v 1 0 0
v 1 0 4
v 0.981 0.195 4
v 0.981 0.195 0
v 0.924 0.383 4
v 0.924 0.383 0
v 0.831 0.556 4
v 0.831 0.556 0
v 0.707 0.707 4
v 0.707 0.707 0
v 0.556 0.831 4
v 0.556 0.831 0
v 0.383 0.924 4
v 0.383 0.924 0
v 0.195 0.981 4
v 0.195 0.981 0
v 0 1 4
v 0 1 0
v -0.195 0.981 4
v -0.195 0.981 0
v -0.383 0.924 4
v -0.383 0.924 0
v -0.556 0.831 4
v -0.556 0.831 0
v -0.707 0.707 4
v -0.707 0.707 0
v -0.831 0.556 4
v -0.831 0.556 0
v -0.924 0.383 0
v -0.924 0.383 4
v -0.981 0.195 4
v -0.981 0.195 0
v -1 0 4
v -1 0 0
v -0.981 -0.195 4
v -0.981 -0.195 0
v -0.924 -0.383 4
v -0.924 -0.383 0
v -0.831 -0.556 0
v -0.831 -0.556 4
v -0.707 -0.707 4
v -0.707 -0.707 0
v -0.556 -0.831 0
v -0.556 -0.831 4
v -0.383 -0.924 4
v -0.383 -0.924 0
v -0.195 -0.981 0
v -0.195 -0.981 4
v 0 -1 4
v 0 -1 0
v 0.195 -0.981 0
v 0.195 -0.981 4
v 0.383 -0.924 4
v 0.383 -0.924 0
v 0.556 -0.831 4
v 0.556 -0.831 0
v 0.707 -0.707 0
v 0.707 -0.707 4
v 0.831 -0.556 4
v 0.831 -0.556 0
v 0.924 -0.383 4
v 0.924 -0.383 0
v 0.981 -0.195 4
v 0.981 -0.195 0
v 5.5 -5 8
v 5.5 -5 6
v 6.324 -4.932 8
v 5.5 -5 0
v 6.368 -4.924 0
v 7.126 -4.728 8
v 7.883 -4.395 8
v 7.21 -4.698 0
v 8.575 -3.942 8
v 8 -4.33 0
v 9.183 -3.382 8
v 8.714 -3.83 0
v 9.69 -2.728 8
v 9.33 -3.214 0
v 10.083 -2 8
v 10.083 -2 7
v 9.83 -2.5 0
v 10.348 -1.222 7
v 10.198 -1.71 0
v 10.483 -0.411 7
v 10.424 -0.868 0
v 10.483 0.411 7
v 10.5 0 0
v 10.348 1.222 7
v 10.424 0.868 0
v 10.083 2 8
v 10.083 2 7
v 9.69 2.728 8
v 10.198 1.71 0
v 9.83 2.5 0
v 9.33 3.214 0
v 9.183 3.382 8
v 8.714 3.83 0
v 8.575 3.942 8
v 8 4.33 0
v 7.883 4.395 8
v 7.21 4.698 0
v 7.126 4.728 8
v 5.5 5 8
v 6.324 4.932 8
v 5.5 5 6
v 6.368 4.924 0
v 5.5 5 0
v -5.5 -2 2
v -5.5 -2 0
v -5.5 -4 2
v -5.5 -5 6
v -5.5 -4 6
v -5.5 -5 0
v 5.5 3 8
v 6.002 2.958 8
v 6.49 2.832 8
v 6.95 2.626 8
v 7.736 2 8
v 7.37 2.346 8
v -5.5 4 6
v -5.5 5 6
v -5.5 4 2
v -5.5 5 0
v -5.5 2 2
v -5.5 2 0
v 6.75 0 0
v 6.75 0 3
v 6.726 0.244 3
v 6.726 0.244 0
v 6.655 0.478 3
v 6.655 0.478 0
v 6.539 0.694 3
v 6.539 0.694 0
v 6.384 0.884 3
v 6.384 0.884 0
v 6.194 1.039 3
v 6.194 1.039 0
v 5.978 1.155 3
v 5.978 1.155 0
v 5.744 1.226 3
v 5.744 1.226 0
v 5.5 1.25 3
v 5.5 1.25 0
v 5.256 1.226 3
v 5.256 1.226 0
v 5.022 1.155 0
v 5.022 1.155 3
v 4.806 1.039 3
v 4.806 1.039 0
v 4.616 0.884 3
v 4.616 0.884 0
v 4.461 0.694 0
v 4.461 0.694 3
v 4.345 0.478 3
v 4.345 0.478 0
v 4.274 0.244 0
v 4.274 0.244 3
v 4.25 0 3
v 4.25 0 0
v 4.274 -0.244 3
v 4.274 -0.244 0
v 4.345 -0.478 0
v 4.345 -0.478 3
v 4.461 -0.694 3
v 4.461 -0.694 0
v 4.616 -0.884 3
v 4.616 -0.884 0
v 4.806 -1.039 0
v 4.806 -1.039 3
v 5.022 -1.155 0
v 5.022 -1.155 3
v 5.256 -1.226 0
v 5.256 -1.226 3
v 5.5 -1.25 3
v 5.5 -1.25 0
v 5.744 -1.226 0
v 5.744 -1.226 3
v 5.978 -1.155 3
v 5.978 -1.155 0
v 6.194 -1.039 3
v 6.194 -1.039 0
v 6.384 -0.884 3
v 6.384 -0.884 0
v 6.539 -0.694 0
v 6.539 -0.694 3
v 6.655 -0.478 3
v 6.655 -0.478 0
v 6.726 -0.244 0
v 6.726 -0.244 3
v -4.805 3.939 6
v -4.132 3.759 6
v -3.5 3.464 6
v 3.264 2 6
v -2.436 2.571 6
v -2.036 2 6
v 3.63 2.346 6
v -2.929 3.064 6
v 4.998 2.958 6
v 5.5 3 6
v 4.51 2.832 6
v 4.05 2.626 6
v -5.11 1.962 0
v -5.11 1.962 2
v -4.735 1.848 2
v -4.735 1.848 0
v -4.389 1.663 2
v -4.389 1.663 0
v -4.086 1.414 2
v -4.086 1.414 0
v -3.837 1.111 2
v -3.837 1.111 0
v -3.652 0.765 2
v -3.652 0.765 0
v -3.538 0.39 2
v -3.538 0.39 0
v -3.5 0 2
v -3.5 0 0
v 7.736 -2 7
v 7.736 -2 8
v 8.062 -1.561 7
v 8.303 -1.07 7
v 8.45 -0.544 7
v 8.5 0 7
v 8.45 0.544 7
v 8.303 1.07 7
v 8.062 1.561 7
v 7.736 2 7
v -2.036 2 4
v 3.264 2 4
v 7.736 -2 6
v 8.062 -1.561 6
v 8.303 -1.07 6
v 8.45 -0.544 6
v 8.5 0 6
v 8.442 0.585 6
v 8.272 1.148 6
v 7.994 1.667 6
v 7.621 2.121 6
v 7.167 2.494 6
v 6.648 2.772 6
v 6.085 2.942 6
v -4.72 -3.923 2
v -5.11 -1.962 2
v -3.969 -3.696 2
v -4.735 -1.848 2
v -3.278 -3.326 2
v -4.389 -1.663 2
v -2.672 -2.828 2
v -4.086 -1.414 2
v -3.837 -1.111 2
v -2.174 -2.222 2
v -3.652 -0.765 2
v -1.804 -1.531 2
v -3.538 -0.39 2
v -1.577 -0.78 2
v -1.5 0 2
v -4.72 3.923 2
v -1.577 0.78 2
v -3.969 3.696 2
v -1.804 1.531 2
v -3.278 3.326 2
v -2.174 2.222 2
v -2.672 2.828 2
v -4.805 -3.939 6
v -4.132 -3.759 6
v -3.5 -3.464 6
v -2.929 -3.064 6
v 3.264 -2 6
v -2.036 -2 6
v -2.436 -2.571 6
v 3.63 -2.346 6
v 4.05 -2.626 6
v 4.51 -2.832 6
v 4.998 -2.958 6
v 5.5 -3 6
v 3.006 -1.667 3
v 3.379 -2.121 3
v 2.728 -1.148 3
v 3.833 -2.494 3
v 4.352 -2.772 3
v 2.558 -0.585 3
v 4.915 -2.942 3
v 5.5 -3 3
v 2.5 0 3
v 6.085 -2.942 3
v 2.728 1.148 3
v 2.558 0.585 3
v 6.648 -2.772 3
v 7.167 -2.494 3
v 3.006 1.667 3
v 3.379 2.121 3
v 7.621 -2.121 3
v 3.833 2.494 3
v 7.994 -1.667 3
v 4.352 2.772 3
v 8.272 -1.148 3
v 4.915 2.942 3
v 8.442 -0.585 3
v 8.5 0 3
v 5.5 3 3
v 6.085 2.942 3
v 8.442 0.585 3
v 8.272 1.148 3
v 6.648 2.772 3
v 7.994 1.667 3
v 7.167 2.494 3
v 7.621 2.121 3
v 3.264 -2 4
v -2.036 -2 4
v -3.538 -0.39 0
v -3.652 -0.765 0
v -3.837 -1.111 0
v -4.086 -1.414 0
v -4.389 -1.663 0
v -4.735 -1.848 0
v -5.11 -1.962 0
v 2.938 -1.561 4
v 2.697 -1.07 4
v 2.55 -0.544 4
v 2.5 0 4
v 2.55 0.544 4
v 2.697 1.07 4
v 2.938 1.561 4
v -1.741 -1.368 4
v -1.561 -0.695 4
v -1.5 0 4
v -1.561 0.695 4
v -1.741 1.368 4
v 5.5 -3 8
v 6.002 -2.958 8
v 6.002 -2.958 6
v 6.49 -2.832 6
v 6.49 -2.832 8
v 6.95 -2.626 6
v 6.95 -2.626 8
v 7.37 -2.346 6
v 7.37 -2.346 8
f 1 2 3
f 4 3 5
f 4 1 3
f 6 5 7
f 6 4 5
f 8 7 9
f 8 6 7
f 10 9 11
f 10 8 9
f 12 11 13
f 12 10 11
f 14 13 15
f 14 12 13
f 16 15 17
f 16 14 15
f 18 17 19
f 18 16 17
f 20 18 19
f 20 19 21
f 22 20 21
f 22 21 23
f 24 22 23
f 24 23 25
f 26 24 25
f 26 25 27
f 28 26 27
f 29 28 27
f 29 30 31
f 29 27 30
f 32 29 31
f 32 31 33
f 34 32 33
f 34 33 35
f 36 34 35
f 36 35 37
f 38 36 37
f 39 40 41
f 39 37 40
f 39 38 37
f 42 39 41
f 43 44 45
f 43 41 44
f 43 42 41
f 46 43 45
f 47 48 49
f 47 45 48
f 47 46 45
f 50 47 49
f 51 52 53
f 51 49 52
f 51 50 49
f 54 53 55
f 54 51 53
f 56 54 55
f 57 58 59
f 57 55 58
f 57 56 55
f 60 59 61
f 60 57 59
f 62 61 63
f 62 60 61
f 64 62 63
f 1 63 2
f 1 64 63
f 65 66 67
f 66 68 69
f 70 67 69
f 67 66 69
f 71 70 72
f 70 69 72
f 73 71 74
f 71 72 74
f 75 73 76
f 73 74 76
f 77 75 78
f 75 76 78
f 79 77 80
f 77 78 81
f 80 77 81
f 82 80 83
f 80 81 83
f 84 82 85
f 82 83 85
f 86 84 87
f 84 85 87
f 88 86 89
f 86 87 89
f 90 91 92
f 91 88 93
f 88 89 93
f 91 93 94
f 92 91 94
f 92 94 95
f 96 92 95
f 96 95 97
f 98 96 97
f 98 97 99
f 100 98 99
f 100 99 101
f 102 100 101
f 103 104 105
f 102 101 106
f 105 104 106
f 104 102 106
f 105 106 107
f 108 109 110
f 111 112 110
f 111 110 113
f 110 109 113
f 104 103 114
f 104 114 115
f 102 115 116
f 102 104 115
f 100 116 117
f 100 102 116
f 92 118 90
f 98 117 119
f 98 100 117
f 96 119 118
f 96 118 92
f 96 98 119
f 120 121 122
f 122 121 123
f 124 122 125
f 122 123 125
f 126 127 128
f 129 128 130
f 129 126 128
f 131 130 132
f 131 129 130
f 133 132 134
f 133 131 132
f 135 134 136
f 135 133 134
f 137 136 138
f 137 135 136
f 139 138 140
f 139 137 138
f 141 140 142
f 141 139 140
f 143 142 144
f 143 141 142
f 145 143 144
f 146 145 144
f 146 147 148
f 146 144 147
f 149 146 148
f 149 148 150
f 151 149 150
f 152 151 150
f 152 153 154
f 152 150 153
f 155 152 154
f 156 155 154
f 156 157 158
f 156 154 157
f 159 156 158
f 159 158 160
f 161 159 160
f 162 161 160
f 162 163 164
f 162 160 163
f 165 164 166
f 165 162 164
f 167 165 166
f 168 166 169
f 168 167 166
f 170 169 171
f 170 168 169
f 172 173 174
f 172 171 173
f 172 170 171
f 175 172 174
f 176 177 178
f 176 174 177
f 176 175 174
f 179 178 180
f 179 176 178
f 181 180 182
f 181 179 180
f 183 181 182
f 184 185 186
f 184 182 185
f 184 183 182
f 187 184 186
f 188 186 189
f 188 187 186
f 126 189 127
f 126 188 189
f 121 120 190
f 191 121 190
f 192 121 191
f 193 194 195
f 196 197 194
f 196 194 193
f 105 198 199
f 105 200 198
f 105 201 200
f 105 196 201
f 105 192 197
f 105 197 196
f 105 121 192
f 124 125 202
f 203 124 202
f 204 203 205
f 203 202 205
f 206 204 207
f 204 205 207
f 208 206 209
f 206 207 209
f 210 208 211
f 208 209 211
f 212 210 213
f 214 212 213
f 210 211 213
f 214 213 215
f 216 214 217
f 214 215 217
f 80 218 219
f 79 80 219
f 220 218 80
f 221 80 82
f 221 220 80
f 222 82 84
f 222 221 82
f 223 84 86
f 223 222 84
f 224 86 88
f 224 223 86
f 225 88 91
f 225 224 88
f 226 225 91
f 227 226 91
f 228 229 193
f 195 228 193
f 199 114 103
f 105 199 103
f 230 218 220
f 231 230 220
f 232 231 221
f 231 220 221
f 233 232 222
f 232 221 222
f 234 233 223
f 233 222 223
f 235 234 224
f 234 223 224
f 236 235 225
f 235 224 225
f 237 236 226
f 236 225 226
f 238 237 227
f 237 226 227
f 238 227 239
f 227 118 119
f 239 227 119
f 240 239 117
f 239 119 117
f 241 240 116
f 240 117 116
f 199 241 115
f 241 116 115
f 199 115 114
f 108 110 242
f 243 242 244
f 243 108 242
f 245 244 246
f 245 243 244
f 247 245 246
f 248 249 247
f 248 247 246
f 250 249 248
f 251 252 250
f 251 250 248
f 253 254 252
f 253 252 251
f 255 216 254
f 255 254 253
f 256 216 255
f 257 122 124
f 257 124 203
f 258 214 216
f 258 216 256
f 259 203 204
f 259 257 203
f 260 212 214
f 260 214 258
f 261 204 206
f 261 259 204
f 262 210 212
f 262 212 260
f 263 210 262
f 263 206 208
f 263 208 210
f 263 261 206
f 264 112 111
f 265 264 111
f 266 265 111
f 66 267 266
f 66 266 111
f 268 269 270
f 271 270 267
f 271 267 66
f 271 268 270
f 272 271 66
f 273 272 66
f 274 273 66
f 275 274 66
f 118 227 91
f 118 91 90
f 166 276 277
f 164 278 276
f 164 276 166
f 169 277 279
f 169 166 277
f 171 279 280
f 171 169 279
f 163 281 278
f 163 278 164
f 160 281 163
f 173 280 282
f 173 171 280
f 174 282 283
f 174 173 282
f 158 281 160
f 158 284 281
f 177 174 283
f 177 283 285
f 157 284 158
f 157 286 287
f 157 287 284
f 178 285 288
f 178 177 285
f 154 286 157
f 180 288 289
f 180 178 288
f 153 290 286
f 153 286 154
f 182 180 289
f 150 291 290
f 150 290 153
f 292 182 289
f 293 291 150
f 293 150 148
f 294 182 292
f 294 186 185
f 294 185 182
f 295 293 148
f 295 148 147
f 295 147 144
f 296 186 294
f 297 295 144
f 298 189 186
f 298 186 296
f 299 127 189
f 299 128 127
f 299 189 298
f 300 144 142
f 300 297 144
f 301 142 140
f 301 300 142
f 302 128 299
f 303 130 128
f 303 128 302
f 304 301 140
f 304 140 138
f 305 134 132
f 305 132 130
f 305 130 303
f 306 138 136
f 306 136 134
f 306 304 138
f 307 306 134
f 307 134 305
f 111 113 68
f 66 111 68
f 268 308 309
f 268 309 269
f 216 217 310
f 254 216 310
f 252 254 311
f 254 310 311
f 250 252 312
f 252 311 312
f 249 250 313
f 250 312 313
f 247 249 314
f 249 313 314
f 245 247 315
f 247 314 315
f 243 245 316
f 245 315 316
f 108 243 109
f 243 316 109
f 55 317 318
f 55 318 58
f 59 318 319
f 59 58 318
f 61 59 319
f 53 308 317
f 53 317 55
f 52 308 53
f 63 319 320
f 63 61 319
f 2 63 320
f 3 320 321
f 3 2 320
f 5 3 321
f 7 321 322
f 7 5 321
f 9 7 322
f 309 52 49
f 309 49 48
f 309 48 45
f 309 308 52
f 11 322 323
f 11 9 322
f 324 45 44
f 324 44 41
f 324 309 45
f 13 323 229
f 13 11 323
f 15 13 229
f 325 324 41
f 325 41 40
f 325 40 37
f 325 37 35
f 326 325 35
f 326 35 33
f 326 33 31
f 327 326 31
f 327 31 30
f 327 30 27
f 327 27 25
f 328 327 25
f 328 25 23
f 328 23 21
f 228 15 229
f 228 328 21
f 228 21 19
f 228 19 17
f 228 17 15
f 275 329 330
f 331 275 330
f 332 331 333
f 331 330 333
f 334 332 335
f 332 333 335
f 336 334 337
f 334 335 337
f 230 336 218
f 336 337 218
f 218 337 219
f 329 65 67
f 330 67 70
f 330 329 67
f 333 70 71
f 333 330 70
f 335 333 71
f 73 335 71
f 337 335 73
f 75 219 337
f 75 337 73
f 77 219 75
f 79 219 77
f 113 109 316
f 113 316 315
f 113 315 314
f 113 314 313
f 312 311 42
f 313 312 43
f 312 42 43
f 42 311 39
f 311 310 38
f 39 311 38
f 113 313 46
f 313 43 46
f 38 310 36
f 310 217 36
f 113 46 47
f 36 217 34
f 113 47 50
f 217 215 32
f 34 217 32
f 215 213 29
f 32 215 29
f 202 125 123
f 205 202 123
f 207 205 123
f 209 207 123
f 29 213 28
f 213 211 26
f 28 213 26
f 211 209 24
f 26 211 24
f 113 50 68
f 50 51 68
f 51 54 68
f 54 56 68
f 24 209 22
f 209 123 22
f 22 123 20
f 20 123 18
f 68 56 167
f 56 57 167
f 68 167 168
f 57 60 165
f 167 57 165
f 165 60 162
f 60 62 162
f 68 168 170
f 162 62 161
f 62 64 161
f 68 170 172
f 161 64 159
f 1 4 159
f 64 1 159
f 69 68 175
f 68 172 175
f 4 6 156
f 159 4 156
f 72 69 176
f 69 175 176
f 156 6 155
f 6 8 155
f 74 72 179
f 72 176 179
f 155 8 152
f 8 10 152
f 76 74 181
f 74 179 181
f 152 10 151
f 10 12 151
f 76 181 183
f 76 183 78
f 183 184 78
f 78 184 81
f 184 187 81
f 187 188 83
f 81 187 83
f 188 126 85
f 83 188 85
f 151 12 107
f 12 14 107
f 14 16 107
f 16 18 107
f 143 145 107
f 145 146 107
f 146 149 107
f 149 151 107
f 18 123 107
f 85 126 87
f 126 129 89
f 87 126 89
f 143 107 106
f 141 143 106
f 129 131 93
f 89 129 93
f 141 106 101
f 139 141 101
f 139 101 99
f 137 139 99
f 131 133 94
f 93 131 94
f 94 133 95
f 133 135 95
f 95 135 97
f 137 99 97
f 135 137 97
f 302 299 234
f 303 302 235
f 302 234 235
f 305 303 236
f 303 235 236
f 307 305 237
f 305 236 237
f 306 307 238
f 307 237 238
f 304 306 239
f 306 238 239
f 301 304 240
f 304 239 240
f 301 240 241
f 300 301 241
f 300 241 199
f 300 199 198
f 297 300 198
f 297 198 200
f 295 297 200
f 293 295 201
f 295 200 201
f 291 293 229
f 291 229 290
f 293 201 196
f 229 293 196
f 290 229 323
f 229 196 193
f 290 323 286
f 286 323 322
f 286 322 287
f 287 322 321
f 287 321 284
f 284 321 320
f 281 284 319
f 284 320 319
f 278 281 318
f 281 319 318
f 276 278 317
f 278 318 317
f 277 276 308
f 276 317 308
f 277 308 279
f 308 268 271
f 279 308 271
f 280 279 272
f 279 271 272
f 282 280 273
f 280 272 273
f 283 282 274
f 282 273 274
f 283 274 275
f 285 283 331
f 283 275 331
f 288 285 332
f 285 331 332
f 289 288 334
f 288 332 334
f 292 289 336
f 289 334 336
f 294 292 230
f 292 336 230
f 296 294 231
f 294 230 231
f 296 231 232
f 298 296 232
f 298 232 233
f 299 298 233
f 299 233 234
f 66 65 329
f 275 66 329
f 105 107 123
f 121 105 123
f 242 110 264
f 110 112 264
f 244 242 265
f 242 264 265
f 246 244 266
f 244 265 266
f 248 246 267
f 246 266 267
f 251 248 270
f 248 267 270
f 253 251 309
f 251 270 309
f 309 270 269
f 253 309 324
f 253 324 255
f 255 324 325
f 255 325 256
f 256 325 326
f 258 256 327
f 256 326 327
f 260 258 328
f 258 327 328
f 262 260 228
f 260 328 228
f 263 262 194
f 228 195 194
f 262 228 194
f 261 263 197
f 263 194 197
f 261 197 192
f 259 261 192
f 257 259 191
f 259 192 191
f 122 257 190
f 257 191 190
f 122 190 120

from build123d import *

# Parameters (mm, degrees)
SKETCH1_R           = 1
SKETCH1_R_2         = 1.25
BOSS_EXTRUDE1_DEPTH = 8
SKETCH2_W           = 1
SKETCH2_H           = 4
CUT_EXTRUDE1_DEPTH  = 18
CUT_EXTRUDE2_DEPTH  = 2
SKETCH4_W           = 2
SKETCH4_H           = 4
CUT_EXTRUDE3_DEPTH  = 11
SKETCH5_R           = 3
CUT_EXTRUDE4_DEPTH  = 3
SKETCH6_R           = 4
CUT_EXTRUDE5_DEPTH  = 4


with BuildPart() as part:
    # Sketch1 → Boss-Extrude1 (new body)
    with BuildSketch(Plane.XY):
        with BuildLine():
            Line((-5.5, -2), (-5.5, -5))
            Line((-5.5, -5), (5.5, -5))
            ThreePointArc((5.5, -5), (10.5, 0), (5.5, 5))
            Line((5.5, 5), (-5.5, 5))
            Line((-5.5, 5), (-5.5, 2))
            ThreePointArc((-5.5, 2), (-4.085786438, 1.414213562), (-3.5, 0))
            ThreePointArc((-3.5, 0), (-4.085786438, -1.414213562), (-5.5, -2))
        make_face()
        Circle(SKETCH1_R, mode=Mode.SUBTRACT)
        with Locations((5.5, 0)):
            Circle(SKETCH1_R_2, mode=Mode.SUBTRACT)
    extrude(amount=BOSS_EXTRUDE1_DEPTH)

    # Sketch2 → Cut-Extrude1 (cut)
    with BuildSketch(Plane.ZY.offset(5.5)):
        with Locations((7.5, 0)):
            Rectangle(SKETCH2_W, SKETCH2_H)
    extrude(amount=-CUT_EXTRUDE1_DEPTH, mode=Mode.SUBTRACT)

    # Sketch3 → Cut-Extrude2 (cut)
    with BuildSketch(Plane.XY.offset(8)):
        with BuildLine():
            Line((5.5, 3), (5.5, 5))
            Line((5.5, 5), (5.5, 6.324669678))
            Line((5.5, 6.324669678), (-9.434593506, 6.108583723))
            Line((-9.434593506, 6.108583723), (-8.586871683, -6.45764565))
            Line((-8.586871683, -6.45764565), (-0.126275451, -6.673731605))
            Line((-0.126275451, -6.673731605), (5.5, -5))
            Line((5.5, -5), (-5.5, -5))
            Line((-5.5, -5), (-5.5, -2))
            Line((-5.5, -2), (7.736067977, -2))
            ThreePointArc((7.736067977, -2), (8.238612788, 1.224744871), (5.5, 3))
        make_face()
        with BuildLine():
            ThreePointArc((5.5, -3), (6.724744871, -2.738612788), (7.736067977, -2))
            Line((7.736067977, -2), (-5.5, -2))
            Line((-5.5, -2), (-5.5, -5))
            Line((-5.5, -5), (5.5, -5))
            Line((5.5, -5), (5.5, -3))
        make_face()
    extrude(amount=-CUT_EXTRUDE2_DEPTH, mode=Mode.SUBTRACT)

    # Sketch4 → Cut-Extrude3 (cut)
    with BuildSketch(Plane.ZY.offset(5.5)):
        with Locations((5, 0)):
            Rectangle(SKETCH4_W, SKETCH4_H)
    extrude(amount=-CUT_EXTRUDE3_DEPTH, mode=Mode.SUBTRACT)

    # Sketch5 → Cut-Extrude4 (cut)
    with BuildSketch(Plane.XY.offset(6)):
        with Locations((5.5, 0)):
            Circle(SKETCH5_R)
    extrude(amount=-CUT_EXTRUDE4_DEPTH, mode=Mode.SUBTRACT)

    # Sketch6 → Cut-Extrude5 (cut)
    with BuildSketch(Plane.XY.offset(6)):
        with Locations((-5.5, 0)):
            Circle(SKETCH6_R)
    extrude(amount=-CUT_EXTRUDE5_DEPTH, mode=Mode.SUBTRACT)


solid = part.part
